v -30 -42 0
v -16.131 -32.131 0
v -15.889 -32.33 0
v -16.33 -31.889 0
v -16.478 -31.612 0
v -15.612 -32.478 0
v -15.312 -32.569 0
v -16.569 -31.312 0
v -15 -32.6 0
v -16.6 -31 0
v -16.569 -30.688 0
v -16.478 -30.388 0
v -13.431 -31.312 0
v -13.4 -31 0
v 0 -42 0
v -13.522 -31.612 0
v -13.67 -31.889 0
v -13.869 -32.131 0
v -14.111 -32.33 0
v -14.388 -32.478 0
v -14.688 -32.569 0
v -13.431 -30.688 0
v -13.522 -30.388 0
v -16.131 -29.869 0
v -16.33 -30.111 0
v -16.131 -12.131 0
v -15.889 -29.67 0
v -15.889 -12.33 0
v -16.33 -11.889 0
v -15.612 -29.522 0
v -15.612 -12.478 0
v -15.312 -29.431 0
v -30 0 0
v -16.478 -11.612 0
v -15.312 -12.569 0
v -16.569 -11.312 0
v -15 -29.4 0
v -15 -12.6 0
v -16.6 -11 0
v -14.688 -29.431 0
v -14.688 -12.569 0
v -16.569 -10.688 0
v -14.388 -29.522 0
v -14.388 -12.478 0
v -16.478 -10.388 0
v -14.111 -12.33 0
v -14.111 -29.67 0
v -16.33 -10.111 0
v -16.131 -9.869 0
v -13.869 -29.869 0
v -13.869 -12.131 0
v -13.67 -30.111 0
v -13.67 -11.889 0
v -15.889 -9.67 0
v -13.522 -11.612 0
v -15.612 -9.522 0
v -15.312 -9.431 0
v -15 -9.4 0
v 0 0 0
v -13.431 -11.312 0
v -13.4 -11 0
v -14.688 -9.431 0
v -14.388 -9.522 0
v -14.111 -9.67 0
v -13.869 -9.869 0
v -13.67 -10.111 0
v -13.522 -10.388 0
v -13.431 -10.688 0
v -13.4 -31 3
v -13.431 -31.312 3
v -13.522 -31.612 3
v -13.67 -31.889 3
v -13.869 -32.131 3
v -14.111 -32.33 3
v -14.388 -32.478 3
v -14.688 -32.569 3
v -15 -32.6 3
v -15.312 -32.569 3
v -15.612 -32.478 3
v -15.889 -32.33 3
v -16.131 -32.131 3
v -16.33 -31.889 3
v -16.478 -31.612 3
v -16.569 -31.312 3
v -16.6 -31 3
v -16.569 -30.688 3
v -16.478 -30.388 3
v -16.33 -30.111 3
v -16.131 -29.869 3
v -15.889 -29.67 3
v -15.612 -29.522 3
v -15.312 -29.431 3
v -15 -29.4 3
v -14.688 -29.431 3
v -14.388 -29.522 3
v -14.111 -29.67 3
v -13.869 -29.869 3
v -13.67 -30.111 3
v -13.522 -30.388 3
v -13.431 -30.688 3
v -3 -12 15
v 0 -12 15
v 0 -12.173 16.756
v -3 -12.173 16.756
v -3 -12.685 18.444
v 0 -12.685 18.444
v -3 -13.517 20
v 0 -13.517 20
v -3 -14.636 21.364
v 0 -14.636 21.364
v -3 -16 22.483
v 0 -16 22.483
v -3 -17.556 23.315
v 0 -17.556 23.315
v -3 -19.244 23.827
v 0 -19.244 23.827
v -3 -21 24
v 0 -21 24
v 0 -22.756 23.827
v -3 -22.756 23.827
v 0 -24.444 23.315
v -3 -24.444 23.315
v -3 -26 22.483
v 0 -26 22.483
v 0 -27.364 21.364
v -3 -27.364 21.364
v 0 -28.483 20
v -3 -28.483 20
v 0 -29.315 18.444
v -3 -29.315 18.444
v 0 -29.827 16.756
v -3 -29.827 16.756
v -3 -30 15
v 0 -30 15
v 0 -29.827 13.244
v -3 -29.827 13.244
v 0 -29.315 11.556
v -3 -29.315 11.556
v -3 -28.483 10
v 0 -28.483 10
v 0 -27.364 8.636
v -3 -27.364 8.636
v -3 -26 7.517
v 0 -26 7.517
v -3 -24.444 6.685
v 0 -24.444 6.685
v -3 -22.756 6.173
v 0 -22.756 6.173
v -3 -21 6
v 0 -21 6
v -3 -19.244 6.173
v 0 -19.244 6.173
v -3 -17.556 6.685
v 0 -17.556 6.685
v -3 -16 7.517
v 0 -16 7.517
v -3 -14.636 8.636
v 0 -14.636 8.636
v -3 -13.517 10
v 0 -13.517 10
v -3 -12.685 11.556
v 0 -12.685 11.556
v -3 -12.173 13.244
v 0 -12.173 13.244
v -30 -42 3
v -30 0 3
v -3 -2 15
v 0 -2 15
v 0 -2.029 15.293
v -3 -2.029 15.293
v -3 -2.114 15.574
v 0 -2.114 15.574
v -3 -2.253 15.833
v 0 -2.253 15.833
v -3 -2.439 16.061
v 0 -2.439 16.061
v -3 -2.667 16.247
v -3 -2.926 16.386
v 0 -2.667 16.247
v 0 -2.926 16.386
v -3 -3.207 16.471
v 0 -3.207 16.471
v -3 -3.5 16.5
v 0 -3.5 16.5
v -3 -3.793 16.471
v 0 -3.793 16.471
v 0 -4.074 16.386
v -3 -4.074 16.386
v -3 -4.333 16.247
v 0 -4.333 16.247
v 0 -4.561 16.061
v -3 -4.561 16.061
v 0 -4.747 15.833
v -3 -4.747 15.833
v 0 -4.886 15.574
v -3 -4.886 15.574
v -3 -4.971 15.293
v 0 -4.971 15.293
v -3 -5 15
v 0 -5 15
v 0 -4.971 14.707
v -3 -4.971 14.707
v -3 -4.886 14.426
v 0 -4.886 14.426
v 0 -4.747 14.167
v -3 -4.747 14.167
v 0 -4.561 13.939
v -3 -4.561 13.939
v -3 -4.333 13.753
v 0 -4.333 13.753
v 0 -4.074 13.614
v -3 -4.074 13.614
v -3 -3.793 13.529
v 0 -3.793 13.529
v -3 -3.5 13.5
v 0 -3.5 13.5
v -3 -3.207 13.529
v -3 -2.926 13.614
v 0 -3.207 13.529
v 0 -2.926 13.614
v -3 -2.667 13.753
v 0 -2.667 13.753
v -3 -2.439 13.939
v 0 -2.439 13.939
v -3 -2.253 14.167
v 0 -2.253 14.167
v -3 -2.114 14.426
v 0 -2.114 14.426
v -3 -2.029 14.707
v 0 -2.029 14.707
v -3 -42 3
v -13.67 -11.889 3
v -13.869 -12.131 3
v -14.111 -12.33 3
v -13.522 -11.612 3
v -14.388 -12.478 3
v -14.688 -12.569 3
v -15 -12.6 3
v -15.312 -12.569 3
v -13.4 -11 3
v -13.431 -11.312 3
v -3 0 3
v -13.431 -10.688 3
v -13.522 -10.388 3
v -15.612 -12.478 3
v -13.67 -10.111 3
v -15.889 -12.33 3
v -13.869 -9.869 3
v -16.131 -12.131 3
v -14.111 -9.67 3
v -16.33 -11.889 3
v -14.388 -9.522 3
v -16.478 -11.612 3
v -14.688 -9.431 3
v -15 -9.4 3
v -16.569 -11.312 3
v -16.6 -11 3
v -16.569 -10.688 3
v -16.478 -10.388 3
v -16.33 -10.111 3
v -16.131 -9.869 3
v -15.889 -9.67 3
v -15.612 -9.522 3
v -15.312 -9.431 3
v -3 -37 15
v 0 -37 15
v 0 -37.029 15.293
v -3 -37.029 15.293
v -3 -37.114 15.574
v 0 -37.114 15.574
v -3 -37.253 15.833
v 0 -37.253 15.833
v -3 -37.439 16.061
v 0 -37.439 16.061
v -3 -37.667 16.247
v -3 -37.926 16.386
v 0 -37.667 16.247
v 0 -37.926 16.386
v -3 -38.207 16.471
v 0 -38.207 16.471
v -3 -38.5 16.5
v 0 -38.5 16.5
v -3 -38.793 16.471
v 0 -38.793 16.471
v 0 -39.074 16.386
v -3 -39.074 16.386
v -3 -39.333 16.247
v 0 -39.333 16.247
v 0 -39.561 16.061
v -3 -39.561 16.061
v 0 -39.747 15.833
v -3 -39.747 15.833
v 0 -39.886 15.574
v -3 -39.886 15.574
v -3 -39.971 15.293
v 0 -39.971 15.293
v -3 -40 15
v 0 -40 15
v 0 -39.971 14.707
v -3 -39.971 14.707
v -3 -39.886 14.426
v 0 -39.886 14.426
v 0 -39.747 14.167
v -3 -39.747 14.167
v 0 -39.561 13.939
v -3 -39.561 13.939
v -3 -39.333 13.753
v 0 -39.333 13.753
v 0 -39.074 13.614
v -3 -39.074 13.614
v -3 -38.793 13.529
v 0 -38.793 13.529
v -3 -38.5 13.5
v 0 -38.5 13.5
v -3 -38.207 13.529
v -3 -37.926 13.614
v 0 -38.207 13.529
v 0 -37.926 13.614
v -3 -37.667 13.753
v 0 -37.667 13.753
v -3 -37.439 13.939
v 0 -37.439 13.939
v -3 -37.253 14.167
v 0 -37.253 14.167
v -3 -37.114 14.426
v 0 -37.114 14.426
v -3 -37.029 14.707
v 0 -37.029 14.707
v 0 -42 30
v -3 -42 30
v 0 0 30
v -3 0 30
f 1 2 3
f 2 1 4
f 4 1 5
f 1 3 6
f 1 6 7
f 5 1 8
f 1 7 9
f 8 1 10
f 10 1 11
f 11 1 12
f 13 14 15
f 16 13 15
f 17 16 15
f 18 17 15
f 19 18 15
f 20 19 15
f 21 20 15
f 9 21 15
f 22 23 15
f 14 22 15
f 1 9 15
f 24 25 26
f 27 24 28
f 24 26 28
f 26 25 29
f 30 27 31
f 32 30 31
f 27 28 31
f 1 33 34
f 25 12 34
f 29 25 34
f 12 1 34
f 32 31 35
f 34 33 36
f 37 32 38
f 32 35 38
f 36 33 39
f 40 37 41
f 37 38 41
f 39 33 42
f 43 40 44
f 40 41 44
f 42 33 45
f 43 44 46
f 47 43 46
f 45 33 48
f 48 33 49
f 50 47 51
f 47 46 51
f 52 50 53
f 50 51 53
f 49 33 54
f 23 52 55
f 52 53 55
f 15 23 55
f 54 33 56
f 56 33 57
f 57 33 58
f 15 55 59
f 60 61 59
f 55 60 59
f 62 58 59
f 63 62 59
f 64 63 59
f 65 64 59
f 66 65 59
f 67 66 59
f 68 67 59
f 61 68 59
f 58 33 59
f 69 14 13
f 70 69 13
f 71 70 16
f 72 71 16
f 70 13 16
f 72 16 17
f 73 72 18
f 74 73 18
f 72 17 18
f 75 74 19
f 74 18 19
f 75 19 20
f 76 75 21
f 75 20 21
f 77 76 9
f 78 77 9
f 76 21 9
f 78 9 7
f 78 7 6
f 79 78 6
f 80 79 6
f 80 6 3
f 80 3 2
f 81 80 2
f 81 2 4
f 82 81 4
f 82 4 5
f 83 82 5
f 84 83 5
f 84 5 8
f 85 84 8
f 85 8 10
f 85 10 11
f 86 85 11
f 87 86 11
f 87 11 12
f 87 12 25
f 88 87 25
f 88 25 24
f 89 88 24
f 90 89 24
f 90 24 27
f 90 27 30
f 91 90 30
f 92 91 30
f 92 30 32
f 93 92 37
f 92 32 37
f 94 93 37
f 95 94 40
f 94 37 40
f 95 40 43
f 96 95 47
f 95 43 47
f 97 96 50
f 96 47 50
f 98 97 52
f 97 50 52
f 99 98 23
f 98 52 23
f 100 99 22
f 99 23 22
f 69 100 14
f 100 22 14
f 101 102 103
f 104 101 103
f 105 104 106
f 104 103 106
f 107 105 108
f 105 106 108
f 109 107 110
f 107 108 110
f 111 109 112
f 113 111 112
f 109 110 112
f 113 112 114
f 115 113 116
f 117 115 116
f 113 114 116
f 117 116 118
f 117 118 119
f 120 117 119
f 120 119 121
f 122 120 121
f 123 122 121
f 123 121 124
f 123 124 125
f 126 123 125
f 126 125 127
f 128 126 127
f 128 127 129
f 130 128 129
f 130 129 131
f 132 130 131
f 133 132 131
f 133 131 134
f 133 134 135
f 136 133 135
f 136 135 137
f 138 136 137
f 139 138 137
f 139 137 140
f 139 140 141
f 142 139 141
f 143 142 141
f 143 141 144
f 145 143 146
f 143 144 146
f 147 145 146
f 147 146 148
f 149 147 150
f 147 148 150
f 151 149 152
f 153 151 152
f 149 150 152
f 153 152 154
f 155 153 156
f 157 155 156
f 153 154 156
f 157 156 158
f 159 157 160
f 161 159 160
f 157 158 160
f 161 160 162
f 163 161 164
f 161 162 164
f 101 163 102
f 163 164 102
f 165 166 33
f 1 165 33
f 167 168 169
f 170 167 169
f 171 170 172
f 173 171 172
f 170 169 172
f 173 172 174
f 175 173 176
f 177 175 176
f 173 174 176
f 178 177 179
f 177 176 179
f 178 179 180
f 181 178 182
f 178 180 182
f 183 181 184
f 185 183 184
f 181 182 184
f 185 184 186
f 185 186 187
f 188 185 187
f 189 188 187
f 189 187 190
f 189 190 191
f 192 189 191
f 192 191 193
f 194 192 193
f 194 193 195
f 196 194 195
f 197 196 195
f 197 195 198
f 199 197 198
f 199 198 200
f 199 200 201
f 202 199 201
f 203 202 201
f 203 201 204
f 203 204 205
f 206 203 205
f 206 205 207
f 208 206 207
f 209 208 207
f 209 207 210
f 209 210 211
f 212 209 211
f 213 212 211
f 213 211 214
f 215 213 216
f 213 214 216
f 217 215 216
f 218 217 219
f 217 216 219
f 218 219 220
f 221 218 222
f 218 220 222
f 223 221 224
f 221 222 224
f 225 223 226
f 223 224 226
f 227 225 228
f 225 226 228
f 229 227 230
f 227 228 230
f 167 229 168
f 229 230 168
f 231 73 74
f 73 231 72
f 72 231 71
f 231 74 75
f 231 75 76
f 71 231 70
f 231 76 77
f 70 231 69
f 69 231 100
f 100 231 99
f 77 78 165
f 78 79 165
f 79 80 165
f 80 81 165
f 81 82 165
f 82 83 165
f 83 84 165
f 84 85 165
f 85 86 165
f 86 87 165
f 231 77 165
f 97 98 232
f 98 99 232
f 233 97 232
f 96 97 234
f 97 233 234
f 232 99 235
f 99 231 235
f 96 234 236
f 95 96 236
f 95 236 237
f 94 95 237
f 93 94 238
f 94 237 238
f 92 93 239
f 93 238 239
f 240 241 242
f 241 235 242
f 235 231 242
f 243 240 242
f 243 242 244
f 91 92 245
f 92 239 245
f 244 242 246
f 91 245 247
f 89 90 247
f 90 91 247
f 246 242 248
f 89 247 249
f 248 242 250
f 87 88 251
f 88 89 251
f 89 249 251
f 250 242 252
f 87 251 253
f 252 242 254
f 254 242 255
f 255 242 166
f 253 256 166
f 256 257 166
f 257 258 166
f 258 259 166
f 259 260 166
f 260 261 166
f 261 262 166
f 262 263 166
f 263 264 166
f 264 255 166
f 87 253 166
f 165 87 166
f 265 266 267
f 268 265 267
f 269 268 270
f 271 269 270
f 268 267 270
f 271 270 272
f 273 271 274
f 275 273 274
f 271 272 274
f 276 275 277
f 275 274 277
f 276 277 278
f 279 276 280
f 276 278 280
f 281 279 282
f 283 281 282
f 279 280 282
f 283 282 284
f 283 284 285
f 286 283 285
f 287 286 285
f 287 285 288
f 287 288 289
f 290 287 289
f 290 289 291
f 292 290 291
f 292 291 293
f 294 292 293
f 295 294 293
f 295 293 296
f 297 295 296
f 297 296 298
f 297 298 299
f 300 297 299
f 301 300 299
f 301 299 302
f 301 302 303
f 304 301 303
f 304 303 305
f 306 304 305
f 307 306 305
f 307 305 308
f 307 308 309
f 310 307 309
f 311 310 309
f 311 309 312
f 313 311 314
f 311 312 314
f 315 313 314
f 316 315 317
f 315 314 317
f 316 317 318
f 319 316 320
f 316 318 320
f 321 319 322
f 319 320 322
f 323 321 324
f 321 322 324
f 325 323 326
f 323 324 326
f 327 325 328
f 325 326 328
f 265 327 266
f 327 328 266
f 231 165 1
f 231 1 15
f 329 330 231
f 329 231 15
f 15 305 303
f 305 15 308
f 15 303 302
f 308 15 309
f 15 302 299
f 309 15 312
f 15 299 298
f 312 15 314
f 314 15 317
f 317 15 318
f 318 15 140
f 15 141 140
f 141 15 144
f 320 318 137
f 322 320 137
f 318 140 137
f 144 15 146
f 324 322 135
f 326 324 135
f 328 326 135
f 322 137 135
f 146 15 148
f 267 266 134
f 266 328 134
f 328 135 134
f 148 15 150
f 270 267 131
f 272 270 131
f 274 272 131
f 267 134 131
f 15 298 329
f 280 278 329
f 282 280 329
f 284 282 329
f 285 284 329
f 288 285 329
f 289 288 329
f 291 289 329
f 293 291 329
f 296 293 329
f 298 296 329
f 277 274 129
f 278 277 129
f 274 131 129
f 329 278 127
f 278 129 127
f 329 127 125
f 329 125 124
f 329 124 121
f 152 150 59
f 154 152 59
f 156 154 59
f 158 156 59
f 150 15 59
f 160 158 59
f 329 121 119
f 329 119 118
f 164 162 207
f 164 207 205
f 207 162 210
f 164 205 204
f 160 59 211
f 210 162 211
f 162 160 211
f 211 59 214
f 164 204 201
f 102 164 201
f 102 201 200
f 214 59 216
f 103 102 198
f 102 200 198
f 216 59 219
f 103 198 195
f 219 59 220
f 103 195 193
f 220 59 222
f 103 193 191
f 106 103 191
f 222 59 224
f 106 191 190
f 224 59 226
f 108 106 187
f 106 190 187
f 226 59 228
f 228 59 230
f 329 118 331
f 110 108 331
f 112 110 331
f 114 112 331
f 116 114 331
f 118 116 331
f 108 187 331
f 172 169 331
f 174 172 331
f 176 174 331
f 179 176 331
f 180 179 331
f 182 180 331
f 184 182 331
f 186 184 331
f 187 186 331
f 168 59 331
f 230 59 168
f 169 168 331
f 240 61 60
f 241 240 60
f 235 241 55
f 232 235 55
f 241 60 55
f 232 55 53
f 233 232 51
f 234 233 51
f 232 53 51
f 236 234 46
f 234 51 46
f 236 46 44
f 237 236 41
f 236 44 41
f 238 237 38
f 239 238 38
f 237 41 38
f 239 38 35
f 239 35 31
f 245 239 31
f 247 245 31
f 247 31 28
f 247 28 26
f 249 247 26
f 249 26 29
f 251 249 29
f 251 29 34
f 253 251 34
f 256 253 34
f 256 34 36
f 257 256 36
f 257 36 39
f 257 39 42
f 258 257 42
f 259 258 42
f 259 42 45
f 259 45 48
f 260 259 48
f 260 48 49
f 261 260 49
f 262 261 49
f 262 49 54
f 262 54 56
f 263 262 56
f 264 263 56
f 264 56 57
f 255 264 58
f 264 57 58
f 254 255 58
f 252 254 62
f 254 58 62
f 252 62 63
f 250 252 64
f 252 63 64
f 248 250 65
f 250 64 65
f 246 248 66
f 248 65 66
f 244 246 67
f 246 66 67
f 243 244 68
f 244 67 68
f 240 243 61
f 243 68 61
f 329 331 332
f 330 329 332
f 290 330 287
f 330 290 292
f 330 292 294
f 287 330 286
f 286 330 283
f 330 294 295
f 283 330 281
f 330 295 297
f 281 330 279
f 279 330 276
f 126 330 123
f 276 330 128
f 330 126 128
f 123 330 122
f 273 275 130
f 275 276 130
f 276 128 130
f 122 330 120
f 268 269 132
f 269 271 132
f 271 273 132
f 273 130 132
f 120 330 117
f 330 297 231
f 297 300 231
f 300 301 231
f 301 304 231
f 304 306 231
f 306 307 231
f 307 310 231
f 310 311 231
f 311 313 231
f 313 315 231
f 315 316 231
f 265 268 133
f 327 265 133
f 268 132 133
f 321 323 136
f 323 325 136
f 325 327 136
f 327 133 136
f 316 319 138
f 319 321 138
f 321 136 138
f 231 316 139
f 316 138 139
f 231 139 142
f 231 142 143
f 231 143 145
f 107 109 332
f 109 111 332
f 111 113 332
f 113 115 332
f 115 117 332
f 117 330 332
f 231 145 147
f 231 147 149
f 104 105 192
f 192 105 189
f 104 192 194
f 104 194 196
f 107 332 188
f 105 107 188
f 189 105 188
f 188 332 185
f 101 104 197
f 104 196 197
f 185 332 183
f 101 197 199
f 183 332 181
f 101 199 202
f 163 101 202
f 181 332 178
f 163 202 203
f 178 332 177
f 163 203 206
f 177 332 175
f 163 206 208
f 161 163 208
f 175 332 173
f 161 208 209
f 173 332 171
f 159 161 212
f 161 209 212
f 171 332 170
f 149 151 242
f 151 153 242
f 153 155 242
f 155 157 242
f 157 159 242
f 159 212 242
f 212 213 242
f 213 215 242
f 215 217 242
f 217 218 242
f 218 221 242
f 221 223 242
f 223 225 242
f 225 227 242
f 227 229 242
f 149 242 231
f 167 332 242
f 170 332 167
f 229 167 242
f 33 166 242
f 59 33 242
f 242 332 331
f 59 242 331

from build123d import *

# Parameters (mm, degrees)
F1_DEPTH = 42
F2_R     = 9
F2_R_2   = 1.5
F3_DEPTH = 30.001
F4_R     = 1.6
F5_DEPTH = 30.001


with BuildPart() as f1:
    # F0 (on Front) → F1 (new body)
    with BuildSketch(Plane.XZ):
        Polygon((0, 0), (0, 30), (-3, 30), (-3, 3), (-30, 3), (-30, 0), align=None)
    extrude(amount=F1_DEPTH)

    # F2 (on face) → F3 (cut, through all)
    with BuildSketch(Plane.YZ):
        with Locations((-21, 15)):
            Circle(F2_R)
        with Locations((-3.5, 15)):
            Circle(F2_R_2)
        with Locations((-38.5, 15)):
            Circle(F2_R_2)
    extrude(amount=-F3_DEPTH, mode=Mode.SUBTRACT)

    # F4 (on face) → F5 (cut, through all)
    with BuildSketch(Plane(origin=(0, 0, 0), x_dir=(1, 0, 0), z_dir=(0, 0, -1))):
        with Locations((-15, 11)):
            Circle(F4_R)
        with Locations((-15, 31)):
            Circle(F4_R)
    extrude(amount=-F5_DEPTH, mode=Mode.SUBTRACT)


solid = f1.part
